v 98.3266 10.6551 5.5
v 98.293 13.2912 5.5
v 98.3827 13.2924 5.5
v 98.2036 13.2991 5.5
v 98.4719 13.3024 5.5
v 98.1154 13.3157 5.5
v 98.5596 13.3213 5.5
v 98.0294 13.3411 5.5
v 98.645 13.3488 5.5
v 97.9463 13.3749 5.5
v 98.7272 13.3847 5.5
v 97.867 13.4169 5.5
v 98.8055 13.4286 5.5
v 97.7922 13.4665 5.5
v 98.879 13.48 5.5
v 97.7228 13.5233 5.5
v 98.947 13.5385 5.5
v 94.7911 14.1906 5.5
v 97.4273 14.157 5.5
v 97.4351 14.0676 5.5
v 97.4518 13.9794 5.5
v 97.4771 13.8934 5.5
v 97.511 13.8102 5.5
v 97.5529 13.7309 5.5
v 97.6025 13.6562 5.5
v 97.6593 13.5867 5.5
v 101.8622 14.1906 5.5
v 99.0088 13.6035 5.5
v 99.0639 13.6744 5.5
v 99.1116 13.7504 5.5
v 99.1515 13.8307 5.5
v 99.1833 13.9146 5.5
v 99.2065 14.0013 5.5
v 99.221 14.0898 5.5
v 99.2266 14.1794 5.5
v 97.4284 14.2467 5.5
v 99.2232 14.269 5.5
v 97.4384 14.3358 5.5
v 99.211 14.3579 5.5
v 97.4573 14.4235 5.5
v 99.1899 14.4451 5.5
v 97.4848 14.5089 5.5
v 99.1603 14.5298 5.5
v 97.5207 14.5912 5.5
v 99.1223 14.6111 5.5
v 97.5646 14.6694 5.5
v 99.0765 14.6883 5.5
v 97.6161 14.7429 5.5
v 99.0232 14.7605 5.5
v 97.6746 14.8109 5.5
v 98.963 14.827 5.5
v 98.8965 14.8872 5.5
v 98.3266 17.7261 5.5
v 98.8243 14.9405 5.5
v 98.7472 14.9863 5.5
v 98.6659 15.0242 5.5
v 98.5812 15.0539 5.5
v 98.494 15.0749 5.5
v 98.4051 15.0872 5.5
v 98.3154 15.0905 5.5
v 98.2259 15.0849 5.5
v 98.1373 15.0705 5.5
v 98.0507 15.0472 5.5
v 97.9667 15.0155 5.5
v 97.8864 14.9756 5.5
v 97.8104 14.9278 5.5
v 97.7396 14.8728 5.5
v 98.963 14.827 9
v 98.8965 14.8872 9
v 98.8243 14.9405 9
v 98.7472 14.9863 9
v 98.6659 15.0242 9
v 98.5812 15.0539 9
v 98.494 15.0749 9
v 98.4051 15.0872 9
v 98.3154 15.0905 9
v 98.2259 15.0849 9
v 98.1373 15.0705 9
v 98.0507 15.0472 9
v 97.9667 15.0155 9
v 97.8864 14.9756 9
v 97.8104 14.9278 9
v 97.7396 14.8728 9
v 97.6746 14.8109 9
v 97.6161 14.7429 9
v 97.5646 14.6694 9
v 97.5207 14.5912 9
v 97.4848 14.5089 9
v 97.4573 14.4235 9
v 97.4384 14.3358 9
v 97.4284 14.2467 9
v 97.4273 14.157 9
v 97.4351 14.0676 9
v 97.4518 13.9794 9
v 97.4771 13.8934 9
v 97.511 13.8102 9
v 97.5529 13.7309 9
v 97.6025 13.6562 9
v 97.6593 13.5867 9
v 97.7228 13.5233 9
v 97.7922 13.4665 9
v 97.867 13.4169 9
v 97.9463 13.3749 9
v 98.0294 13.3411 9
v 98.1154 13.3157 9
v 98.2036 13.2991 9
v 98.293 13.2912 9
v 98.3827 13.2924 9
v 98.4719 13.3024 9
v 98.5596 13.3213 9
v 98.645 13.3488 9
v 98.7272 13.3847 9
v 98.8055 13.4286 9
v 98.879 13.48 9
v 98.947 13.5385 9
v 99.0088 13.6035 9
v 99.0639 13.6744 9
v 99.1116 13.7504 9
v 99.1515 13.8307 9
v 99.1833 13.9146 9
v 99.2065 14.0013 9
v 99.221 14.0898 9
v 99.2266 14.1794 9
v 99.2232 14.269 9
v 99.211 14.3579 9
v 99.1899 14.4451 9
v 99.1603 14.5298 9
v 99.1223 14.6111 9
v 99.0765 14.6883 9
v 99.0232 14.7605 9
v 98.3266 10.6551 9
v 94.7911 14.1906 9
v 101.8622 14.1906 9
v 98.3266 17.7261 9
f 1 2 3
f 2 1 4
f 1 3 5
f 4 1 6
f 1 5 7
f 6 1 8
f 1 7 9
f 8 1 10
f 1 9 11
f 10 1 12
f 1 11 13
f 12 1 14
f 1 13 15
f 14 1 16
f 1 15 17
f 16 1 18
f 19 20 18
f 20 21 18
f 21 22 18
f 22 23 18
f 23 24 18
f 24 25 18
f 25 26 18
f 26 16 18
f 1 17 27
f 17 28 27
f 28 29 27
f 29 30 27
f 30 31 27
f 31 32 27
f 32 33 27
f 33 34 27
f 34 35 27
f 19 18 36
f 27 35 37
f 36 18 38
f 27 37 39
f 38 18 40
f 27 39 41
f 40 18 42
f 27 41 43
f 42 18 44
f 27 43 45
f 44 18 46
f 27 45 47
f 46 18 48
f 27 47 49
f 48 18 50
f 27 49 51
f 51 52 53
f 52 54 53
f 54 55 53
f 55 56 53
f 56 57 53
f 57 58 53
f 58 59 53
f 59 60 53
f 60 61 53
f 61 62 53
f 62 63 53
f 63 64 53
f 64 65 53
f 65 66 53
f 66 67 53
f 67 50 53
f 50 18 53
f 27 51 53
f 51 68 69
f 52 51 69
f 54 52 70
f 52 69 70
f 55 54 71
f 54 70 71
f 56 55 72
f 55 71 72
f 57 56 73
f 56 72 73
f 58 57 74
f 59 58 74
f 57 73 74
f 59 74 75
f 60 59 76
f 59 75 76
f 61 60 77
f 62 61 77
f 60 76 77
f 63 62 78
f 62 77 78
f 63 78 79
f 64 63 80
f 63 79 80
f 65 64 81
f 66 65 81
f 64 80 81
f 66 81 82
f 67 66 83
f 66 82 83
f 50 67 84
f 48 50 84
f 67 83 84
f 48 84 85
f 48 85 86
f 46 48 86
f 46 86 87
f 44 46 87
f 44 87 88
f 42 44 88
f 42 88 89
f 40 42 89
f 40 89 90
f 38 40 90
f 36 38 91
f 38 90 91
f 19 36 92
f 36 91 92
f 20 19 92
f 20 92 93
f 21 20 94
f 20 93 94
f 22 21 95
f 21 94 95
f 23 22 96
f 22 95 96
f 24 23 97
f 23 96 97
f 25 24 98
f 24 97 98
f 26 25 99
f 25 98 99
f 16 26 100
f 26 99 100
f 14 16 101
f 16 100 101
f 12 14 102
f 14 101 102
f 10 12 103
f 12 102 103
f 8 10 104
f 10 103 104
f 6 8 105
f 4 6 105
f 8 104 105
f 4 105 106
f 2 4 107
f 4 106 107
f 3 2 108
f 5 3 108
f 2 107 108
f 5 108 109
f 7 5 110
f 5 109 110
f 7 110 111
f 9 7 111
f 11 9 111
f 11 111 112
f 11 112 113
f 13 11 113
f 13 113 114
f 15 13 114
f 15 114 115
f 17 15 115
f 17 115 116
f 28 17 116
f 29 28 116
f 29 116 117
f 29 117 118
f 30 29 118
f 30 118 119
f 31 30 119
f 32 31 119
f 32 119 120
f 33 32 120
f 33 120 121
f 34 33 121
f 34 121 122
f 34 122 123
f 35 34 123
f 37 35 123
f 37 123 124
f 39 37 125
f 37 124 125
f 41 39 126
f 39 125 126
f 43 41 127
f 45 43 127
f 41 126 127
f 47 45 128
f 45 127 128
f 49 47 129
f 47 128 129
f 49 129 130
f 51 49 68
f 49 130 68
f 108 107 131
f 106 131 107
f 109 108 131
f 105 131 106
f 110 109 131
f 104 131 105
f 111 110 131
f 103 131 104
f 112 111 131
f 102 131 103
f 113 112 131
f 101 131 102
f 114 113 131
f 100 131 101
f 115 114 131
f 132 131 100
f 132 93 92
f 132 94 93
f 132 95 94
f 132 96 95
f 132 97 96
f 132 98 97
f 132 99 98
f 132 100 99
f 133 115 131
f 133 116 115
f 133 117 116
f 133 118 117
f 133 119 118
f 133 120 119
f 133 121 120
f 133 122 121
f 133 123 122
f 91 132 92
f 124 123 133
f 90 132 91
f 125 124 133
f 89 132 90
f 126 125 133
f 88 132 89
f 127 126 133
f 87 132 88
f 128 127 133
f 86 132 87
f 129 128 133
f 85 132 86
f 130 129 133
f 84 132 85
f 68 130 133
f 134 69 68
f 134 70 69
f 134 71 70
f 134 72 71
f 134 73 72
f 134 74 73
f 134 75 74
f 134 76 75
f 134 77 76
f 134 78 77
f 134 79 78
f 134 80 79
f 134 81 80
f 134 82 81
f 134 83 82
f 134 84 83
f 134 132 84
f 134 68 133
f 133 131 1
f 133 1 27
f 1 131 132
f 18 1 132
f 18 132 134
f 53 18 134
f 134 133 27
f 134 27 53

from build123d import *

# Parameters (mm, degrees)
CYLINDER012_R            = 0.9
CYLINDER012_DEPTH        = 3.5
BOX039_W                 = 5
BOX039_H                 = 5
BOX039_DEPTH             = 3.5
CLONE011_PLACEMENT_ANGLE = 45


with BuildPart() as anchorscrew:
    # Cylinder012 → Cylinder012 (new body)
    with BuildSketch(Plane(origin=(2.5, 2.5, 0), x_dir=(1, 0, 0), z_dir=(0, 0, 1))):
        Circle(CYLINDER012_R)
    extrude(amount=CYLINDER012_DEPTH)


with BuildPart() as anchor006:
    # Box039 → Box039 (new body)
    with BuildSketch(Plane.XY):
        with Locations((2.5, 2.5)):
            Rectangle(BOX039_W, BOX039_H)
    extrude(amount=BOX039_DEPTH)

    # Cut010: cut AnchorScrew
    add(anchorscrew.part, mode=Mode.SUBTRACT)


with BuildPart() as anchor006_1:
    # Clone011 placement: moved
    add(anchor006.part.moved(Location((98.326641456, 10.6550685808, 2))).rotate(Axis((98.326641456, 10.6550685808, 2), (0, 0, 1)), CLONE011_PLACEMENT_ANGLE))


with BuildPart() as part_mirroring010:
    # Part__Mirroring010: instance of Anchor006
    add(anchor006_1.part.mirror(Plane(origin=(0, 0, 5.5), x_dir=(0, 1, 0), z_dir=(0, 0, 1))))


solid = part_mirroring010.part
